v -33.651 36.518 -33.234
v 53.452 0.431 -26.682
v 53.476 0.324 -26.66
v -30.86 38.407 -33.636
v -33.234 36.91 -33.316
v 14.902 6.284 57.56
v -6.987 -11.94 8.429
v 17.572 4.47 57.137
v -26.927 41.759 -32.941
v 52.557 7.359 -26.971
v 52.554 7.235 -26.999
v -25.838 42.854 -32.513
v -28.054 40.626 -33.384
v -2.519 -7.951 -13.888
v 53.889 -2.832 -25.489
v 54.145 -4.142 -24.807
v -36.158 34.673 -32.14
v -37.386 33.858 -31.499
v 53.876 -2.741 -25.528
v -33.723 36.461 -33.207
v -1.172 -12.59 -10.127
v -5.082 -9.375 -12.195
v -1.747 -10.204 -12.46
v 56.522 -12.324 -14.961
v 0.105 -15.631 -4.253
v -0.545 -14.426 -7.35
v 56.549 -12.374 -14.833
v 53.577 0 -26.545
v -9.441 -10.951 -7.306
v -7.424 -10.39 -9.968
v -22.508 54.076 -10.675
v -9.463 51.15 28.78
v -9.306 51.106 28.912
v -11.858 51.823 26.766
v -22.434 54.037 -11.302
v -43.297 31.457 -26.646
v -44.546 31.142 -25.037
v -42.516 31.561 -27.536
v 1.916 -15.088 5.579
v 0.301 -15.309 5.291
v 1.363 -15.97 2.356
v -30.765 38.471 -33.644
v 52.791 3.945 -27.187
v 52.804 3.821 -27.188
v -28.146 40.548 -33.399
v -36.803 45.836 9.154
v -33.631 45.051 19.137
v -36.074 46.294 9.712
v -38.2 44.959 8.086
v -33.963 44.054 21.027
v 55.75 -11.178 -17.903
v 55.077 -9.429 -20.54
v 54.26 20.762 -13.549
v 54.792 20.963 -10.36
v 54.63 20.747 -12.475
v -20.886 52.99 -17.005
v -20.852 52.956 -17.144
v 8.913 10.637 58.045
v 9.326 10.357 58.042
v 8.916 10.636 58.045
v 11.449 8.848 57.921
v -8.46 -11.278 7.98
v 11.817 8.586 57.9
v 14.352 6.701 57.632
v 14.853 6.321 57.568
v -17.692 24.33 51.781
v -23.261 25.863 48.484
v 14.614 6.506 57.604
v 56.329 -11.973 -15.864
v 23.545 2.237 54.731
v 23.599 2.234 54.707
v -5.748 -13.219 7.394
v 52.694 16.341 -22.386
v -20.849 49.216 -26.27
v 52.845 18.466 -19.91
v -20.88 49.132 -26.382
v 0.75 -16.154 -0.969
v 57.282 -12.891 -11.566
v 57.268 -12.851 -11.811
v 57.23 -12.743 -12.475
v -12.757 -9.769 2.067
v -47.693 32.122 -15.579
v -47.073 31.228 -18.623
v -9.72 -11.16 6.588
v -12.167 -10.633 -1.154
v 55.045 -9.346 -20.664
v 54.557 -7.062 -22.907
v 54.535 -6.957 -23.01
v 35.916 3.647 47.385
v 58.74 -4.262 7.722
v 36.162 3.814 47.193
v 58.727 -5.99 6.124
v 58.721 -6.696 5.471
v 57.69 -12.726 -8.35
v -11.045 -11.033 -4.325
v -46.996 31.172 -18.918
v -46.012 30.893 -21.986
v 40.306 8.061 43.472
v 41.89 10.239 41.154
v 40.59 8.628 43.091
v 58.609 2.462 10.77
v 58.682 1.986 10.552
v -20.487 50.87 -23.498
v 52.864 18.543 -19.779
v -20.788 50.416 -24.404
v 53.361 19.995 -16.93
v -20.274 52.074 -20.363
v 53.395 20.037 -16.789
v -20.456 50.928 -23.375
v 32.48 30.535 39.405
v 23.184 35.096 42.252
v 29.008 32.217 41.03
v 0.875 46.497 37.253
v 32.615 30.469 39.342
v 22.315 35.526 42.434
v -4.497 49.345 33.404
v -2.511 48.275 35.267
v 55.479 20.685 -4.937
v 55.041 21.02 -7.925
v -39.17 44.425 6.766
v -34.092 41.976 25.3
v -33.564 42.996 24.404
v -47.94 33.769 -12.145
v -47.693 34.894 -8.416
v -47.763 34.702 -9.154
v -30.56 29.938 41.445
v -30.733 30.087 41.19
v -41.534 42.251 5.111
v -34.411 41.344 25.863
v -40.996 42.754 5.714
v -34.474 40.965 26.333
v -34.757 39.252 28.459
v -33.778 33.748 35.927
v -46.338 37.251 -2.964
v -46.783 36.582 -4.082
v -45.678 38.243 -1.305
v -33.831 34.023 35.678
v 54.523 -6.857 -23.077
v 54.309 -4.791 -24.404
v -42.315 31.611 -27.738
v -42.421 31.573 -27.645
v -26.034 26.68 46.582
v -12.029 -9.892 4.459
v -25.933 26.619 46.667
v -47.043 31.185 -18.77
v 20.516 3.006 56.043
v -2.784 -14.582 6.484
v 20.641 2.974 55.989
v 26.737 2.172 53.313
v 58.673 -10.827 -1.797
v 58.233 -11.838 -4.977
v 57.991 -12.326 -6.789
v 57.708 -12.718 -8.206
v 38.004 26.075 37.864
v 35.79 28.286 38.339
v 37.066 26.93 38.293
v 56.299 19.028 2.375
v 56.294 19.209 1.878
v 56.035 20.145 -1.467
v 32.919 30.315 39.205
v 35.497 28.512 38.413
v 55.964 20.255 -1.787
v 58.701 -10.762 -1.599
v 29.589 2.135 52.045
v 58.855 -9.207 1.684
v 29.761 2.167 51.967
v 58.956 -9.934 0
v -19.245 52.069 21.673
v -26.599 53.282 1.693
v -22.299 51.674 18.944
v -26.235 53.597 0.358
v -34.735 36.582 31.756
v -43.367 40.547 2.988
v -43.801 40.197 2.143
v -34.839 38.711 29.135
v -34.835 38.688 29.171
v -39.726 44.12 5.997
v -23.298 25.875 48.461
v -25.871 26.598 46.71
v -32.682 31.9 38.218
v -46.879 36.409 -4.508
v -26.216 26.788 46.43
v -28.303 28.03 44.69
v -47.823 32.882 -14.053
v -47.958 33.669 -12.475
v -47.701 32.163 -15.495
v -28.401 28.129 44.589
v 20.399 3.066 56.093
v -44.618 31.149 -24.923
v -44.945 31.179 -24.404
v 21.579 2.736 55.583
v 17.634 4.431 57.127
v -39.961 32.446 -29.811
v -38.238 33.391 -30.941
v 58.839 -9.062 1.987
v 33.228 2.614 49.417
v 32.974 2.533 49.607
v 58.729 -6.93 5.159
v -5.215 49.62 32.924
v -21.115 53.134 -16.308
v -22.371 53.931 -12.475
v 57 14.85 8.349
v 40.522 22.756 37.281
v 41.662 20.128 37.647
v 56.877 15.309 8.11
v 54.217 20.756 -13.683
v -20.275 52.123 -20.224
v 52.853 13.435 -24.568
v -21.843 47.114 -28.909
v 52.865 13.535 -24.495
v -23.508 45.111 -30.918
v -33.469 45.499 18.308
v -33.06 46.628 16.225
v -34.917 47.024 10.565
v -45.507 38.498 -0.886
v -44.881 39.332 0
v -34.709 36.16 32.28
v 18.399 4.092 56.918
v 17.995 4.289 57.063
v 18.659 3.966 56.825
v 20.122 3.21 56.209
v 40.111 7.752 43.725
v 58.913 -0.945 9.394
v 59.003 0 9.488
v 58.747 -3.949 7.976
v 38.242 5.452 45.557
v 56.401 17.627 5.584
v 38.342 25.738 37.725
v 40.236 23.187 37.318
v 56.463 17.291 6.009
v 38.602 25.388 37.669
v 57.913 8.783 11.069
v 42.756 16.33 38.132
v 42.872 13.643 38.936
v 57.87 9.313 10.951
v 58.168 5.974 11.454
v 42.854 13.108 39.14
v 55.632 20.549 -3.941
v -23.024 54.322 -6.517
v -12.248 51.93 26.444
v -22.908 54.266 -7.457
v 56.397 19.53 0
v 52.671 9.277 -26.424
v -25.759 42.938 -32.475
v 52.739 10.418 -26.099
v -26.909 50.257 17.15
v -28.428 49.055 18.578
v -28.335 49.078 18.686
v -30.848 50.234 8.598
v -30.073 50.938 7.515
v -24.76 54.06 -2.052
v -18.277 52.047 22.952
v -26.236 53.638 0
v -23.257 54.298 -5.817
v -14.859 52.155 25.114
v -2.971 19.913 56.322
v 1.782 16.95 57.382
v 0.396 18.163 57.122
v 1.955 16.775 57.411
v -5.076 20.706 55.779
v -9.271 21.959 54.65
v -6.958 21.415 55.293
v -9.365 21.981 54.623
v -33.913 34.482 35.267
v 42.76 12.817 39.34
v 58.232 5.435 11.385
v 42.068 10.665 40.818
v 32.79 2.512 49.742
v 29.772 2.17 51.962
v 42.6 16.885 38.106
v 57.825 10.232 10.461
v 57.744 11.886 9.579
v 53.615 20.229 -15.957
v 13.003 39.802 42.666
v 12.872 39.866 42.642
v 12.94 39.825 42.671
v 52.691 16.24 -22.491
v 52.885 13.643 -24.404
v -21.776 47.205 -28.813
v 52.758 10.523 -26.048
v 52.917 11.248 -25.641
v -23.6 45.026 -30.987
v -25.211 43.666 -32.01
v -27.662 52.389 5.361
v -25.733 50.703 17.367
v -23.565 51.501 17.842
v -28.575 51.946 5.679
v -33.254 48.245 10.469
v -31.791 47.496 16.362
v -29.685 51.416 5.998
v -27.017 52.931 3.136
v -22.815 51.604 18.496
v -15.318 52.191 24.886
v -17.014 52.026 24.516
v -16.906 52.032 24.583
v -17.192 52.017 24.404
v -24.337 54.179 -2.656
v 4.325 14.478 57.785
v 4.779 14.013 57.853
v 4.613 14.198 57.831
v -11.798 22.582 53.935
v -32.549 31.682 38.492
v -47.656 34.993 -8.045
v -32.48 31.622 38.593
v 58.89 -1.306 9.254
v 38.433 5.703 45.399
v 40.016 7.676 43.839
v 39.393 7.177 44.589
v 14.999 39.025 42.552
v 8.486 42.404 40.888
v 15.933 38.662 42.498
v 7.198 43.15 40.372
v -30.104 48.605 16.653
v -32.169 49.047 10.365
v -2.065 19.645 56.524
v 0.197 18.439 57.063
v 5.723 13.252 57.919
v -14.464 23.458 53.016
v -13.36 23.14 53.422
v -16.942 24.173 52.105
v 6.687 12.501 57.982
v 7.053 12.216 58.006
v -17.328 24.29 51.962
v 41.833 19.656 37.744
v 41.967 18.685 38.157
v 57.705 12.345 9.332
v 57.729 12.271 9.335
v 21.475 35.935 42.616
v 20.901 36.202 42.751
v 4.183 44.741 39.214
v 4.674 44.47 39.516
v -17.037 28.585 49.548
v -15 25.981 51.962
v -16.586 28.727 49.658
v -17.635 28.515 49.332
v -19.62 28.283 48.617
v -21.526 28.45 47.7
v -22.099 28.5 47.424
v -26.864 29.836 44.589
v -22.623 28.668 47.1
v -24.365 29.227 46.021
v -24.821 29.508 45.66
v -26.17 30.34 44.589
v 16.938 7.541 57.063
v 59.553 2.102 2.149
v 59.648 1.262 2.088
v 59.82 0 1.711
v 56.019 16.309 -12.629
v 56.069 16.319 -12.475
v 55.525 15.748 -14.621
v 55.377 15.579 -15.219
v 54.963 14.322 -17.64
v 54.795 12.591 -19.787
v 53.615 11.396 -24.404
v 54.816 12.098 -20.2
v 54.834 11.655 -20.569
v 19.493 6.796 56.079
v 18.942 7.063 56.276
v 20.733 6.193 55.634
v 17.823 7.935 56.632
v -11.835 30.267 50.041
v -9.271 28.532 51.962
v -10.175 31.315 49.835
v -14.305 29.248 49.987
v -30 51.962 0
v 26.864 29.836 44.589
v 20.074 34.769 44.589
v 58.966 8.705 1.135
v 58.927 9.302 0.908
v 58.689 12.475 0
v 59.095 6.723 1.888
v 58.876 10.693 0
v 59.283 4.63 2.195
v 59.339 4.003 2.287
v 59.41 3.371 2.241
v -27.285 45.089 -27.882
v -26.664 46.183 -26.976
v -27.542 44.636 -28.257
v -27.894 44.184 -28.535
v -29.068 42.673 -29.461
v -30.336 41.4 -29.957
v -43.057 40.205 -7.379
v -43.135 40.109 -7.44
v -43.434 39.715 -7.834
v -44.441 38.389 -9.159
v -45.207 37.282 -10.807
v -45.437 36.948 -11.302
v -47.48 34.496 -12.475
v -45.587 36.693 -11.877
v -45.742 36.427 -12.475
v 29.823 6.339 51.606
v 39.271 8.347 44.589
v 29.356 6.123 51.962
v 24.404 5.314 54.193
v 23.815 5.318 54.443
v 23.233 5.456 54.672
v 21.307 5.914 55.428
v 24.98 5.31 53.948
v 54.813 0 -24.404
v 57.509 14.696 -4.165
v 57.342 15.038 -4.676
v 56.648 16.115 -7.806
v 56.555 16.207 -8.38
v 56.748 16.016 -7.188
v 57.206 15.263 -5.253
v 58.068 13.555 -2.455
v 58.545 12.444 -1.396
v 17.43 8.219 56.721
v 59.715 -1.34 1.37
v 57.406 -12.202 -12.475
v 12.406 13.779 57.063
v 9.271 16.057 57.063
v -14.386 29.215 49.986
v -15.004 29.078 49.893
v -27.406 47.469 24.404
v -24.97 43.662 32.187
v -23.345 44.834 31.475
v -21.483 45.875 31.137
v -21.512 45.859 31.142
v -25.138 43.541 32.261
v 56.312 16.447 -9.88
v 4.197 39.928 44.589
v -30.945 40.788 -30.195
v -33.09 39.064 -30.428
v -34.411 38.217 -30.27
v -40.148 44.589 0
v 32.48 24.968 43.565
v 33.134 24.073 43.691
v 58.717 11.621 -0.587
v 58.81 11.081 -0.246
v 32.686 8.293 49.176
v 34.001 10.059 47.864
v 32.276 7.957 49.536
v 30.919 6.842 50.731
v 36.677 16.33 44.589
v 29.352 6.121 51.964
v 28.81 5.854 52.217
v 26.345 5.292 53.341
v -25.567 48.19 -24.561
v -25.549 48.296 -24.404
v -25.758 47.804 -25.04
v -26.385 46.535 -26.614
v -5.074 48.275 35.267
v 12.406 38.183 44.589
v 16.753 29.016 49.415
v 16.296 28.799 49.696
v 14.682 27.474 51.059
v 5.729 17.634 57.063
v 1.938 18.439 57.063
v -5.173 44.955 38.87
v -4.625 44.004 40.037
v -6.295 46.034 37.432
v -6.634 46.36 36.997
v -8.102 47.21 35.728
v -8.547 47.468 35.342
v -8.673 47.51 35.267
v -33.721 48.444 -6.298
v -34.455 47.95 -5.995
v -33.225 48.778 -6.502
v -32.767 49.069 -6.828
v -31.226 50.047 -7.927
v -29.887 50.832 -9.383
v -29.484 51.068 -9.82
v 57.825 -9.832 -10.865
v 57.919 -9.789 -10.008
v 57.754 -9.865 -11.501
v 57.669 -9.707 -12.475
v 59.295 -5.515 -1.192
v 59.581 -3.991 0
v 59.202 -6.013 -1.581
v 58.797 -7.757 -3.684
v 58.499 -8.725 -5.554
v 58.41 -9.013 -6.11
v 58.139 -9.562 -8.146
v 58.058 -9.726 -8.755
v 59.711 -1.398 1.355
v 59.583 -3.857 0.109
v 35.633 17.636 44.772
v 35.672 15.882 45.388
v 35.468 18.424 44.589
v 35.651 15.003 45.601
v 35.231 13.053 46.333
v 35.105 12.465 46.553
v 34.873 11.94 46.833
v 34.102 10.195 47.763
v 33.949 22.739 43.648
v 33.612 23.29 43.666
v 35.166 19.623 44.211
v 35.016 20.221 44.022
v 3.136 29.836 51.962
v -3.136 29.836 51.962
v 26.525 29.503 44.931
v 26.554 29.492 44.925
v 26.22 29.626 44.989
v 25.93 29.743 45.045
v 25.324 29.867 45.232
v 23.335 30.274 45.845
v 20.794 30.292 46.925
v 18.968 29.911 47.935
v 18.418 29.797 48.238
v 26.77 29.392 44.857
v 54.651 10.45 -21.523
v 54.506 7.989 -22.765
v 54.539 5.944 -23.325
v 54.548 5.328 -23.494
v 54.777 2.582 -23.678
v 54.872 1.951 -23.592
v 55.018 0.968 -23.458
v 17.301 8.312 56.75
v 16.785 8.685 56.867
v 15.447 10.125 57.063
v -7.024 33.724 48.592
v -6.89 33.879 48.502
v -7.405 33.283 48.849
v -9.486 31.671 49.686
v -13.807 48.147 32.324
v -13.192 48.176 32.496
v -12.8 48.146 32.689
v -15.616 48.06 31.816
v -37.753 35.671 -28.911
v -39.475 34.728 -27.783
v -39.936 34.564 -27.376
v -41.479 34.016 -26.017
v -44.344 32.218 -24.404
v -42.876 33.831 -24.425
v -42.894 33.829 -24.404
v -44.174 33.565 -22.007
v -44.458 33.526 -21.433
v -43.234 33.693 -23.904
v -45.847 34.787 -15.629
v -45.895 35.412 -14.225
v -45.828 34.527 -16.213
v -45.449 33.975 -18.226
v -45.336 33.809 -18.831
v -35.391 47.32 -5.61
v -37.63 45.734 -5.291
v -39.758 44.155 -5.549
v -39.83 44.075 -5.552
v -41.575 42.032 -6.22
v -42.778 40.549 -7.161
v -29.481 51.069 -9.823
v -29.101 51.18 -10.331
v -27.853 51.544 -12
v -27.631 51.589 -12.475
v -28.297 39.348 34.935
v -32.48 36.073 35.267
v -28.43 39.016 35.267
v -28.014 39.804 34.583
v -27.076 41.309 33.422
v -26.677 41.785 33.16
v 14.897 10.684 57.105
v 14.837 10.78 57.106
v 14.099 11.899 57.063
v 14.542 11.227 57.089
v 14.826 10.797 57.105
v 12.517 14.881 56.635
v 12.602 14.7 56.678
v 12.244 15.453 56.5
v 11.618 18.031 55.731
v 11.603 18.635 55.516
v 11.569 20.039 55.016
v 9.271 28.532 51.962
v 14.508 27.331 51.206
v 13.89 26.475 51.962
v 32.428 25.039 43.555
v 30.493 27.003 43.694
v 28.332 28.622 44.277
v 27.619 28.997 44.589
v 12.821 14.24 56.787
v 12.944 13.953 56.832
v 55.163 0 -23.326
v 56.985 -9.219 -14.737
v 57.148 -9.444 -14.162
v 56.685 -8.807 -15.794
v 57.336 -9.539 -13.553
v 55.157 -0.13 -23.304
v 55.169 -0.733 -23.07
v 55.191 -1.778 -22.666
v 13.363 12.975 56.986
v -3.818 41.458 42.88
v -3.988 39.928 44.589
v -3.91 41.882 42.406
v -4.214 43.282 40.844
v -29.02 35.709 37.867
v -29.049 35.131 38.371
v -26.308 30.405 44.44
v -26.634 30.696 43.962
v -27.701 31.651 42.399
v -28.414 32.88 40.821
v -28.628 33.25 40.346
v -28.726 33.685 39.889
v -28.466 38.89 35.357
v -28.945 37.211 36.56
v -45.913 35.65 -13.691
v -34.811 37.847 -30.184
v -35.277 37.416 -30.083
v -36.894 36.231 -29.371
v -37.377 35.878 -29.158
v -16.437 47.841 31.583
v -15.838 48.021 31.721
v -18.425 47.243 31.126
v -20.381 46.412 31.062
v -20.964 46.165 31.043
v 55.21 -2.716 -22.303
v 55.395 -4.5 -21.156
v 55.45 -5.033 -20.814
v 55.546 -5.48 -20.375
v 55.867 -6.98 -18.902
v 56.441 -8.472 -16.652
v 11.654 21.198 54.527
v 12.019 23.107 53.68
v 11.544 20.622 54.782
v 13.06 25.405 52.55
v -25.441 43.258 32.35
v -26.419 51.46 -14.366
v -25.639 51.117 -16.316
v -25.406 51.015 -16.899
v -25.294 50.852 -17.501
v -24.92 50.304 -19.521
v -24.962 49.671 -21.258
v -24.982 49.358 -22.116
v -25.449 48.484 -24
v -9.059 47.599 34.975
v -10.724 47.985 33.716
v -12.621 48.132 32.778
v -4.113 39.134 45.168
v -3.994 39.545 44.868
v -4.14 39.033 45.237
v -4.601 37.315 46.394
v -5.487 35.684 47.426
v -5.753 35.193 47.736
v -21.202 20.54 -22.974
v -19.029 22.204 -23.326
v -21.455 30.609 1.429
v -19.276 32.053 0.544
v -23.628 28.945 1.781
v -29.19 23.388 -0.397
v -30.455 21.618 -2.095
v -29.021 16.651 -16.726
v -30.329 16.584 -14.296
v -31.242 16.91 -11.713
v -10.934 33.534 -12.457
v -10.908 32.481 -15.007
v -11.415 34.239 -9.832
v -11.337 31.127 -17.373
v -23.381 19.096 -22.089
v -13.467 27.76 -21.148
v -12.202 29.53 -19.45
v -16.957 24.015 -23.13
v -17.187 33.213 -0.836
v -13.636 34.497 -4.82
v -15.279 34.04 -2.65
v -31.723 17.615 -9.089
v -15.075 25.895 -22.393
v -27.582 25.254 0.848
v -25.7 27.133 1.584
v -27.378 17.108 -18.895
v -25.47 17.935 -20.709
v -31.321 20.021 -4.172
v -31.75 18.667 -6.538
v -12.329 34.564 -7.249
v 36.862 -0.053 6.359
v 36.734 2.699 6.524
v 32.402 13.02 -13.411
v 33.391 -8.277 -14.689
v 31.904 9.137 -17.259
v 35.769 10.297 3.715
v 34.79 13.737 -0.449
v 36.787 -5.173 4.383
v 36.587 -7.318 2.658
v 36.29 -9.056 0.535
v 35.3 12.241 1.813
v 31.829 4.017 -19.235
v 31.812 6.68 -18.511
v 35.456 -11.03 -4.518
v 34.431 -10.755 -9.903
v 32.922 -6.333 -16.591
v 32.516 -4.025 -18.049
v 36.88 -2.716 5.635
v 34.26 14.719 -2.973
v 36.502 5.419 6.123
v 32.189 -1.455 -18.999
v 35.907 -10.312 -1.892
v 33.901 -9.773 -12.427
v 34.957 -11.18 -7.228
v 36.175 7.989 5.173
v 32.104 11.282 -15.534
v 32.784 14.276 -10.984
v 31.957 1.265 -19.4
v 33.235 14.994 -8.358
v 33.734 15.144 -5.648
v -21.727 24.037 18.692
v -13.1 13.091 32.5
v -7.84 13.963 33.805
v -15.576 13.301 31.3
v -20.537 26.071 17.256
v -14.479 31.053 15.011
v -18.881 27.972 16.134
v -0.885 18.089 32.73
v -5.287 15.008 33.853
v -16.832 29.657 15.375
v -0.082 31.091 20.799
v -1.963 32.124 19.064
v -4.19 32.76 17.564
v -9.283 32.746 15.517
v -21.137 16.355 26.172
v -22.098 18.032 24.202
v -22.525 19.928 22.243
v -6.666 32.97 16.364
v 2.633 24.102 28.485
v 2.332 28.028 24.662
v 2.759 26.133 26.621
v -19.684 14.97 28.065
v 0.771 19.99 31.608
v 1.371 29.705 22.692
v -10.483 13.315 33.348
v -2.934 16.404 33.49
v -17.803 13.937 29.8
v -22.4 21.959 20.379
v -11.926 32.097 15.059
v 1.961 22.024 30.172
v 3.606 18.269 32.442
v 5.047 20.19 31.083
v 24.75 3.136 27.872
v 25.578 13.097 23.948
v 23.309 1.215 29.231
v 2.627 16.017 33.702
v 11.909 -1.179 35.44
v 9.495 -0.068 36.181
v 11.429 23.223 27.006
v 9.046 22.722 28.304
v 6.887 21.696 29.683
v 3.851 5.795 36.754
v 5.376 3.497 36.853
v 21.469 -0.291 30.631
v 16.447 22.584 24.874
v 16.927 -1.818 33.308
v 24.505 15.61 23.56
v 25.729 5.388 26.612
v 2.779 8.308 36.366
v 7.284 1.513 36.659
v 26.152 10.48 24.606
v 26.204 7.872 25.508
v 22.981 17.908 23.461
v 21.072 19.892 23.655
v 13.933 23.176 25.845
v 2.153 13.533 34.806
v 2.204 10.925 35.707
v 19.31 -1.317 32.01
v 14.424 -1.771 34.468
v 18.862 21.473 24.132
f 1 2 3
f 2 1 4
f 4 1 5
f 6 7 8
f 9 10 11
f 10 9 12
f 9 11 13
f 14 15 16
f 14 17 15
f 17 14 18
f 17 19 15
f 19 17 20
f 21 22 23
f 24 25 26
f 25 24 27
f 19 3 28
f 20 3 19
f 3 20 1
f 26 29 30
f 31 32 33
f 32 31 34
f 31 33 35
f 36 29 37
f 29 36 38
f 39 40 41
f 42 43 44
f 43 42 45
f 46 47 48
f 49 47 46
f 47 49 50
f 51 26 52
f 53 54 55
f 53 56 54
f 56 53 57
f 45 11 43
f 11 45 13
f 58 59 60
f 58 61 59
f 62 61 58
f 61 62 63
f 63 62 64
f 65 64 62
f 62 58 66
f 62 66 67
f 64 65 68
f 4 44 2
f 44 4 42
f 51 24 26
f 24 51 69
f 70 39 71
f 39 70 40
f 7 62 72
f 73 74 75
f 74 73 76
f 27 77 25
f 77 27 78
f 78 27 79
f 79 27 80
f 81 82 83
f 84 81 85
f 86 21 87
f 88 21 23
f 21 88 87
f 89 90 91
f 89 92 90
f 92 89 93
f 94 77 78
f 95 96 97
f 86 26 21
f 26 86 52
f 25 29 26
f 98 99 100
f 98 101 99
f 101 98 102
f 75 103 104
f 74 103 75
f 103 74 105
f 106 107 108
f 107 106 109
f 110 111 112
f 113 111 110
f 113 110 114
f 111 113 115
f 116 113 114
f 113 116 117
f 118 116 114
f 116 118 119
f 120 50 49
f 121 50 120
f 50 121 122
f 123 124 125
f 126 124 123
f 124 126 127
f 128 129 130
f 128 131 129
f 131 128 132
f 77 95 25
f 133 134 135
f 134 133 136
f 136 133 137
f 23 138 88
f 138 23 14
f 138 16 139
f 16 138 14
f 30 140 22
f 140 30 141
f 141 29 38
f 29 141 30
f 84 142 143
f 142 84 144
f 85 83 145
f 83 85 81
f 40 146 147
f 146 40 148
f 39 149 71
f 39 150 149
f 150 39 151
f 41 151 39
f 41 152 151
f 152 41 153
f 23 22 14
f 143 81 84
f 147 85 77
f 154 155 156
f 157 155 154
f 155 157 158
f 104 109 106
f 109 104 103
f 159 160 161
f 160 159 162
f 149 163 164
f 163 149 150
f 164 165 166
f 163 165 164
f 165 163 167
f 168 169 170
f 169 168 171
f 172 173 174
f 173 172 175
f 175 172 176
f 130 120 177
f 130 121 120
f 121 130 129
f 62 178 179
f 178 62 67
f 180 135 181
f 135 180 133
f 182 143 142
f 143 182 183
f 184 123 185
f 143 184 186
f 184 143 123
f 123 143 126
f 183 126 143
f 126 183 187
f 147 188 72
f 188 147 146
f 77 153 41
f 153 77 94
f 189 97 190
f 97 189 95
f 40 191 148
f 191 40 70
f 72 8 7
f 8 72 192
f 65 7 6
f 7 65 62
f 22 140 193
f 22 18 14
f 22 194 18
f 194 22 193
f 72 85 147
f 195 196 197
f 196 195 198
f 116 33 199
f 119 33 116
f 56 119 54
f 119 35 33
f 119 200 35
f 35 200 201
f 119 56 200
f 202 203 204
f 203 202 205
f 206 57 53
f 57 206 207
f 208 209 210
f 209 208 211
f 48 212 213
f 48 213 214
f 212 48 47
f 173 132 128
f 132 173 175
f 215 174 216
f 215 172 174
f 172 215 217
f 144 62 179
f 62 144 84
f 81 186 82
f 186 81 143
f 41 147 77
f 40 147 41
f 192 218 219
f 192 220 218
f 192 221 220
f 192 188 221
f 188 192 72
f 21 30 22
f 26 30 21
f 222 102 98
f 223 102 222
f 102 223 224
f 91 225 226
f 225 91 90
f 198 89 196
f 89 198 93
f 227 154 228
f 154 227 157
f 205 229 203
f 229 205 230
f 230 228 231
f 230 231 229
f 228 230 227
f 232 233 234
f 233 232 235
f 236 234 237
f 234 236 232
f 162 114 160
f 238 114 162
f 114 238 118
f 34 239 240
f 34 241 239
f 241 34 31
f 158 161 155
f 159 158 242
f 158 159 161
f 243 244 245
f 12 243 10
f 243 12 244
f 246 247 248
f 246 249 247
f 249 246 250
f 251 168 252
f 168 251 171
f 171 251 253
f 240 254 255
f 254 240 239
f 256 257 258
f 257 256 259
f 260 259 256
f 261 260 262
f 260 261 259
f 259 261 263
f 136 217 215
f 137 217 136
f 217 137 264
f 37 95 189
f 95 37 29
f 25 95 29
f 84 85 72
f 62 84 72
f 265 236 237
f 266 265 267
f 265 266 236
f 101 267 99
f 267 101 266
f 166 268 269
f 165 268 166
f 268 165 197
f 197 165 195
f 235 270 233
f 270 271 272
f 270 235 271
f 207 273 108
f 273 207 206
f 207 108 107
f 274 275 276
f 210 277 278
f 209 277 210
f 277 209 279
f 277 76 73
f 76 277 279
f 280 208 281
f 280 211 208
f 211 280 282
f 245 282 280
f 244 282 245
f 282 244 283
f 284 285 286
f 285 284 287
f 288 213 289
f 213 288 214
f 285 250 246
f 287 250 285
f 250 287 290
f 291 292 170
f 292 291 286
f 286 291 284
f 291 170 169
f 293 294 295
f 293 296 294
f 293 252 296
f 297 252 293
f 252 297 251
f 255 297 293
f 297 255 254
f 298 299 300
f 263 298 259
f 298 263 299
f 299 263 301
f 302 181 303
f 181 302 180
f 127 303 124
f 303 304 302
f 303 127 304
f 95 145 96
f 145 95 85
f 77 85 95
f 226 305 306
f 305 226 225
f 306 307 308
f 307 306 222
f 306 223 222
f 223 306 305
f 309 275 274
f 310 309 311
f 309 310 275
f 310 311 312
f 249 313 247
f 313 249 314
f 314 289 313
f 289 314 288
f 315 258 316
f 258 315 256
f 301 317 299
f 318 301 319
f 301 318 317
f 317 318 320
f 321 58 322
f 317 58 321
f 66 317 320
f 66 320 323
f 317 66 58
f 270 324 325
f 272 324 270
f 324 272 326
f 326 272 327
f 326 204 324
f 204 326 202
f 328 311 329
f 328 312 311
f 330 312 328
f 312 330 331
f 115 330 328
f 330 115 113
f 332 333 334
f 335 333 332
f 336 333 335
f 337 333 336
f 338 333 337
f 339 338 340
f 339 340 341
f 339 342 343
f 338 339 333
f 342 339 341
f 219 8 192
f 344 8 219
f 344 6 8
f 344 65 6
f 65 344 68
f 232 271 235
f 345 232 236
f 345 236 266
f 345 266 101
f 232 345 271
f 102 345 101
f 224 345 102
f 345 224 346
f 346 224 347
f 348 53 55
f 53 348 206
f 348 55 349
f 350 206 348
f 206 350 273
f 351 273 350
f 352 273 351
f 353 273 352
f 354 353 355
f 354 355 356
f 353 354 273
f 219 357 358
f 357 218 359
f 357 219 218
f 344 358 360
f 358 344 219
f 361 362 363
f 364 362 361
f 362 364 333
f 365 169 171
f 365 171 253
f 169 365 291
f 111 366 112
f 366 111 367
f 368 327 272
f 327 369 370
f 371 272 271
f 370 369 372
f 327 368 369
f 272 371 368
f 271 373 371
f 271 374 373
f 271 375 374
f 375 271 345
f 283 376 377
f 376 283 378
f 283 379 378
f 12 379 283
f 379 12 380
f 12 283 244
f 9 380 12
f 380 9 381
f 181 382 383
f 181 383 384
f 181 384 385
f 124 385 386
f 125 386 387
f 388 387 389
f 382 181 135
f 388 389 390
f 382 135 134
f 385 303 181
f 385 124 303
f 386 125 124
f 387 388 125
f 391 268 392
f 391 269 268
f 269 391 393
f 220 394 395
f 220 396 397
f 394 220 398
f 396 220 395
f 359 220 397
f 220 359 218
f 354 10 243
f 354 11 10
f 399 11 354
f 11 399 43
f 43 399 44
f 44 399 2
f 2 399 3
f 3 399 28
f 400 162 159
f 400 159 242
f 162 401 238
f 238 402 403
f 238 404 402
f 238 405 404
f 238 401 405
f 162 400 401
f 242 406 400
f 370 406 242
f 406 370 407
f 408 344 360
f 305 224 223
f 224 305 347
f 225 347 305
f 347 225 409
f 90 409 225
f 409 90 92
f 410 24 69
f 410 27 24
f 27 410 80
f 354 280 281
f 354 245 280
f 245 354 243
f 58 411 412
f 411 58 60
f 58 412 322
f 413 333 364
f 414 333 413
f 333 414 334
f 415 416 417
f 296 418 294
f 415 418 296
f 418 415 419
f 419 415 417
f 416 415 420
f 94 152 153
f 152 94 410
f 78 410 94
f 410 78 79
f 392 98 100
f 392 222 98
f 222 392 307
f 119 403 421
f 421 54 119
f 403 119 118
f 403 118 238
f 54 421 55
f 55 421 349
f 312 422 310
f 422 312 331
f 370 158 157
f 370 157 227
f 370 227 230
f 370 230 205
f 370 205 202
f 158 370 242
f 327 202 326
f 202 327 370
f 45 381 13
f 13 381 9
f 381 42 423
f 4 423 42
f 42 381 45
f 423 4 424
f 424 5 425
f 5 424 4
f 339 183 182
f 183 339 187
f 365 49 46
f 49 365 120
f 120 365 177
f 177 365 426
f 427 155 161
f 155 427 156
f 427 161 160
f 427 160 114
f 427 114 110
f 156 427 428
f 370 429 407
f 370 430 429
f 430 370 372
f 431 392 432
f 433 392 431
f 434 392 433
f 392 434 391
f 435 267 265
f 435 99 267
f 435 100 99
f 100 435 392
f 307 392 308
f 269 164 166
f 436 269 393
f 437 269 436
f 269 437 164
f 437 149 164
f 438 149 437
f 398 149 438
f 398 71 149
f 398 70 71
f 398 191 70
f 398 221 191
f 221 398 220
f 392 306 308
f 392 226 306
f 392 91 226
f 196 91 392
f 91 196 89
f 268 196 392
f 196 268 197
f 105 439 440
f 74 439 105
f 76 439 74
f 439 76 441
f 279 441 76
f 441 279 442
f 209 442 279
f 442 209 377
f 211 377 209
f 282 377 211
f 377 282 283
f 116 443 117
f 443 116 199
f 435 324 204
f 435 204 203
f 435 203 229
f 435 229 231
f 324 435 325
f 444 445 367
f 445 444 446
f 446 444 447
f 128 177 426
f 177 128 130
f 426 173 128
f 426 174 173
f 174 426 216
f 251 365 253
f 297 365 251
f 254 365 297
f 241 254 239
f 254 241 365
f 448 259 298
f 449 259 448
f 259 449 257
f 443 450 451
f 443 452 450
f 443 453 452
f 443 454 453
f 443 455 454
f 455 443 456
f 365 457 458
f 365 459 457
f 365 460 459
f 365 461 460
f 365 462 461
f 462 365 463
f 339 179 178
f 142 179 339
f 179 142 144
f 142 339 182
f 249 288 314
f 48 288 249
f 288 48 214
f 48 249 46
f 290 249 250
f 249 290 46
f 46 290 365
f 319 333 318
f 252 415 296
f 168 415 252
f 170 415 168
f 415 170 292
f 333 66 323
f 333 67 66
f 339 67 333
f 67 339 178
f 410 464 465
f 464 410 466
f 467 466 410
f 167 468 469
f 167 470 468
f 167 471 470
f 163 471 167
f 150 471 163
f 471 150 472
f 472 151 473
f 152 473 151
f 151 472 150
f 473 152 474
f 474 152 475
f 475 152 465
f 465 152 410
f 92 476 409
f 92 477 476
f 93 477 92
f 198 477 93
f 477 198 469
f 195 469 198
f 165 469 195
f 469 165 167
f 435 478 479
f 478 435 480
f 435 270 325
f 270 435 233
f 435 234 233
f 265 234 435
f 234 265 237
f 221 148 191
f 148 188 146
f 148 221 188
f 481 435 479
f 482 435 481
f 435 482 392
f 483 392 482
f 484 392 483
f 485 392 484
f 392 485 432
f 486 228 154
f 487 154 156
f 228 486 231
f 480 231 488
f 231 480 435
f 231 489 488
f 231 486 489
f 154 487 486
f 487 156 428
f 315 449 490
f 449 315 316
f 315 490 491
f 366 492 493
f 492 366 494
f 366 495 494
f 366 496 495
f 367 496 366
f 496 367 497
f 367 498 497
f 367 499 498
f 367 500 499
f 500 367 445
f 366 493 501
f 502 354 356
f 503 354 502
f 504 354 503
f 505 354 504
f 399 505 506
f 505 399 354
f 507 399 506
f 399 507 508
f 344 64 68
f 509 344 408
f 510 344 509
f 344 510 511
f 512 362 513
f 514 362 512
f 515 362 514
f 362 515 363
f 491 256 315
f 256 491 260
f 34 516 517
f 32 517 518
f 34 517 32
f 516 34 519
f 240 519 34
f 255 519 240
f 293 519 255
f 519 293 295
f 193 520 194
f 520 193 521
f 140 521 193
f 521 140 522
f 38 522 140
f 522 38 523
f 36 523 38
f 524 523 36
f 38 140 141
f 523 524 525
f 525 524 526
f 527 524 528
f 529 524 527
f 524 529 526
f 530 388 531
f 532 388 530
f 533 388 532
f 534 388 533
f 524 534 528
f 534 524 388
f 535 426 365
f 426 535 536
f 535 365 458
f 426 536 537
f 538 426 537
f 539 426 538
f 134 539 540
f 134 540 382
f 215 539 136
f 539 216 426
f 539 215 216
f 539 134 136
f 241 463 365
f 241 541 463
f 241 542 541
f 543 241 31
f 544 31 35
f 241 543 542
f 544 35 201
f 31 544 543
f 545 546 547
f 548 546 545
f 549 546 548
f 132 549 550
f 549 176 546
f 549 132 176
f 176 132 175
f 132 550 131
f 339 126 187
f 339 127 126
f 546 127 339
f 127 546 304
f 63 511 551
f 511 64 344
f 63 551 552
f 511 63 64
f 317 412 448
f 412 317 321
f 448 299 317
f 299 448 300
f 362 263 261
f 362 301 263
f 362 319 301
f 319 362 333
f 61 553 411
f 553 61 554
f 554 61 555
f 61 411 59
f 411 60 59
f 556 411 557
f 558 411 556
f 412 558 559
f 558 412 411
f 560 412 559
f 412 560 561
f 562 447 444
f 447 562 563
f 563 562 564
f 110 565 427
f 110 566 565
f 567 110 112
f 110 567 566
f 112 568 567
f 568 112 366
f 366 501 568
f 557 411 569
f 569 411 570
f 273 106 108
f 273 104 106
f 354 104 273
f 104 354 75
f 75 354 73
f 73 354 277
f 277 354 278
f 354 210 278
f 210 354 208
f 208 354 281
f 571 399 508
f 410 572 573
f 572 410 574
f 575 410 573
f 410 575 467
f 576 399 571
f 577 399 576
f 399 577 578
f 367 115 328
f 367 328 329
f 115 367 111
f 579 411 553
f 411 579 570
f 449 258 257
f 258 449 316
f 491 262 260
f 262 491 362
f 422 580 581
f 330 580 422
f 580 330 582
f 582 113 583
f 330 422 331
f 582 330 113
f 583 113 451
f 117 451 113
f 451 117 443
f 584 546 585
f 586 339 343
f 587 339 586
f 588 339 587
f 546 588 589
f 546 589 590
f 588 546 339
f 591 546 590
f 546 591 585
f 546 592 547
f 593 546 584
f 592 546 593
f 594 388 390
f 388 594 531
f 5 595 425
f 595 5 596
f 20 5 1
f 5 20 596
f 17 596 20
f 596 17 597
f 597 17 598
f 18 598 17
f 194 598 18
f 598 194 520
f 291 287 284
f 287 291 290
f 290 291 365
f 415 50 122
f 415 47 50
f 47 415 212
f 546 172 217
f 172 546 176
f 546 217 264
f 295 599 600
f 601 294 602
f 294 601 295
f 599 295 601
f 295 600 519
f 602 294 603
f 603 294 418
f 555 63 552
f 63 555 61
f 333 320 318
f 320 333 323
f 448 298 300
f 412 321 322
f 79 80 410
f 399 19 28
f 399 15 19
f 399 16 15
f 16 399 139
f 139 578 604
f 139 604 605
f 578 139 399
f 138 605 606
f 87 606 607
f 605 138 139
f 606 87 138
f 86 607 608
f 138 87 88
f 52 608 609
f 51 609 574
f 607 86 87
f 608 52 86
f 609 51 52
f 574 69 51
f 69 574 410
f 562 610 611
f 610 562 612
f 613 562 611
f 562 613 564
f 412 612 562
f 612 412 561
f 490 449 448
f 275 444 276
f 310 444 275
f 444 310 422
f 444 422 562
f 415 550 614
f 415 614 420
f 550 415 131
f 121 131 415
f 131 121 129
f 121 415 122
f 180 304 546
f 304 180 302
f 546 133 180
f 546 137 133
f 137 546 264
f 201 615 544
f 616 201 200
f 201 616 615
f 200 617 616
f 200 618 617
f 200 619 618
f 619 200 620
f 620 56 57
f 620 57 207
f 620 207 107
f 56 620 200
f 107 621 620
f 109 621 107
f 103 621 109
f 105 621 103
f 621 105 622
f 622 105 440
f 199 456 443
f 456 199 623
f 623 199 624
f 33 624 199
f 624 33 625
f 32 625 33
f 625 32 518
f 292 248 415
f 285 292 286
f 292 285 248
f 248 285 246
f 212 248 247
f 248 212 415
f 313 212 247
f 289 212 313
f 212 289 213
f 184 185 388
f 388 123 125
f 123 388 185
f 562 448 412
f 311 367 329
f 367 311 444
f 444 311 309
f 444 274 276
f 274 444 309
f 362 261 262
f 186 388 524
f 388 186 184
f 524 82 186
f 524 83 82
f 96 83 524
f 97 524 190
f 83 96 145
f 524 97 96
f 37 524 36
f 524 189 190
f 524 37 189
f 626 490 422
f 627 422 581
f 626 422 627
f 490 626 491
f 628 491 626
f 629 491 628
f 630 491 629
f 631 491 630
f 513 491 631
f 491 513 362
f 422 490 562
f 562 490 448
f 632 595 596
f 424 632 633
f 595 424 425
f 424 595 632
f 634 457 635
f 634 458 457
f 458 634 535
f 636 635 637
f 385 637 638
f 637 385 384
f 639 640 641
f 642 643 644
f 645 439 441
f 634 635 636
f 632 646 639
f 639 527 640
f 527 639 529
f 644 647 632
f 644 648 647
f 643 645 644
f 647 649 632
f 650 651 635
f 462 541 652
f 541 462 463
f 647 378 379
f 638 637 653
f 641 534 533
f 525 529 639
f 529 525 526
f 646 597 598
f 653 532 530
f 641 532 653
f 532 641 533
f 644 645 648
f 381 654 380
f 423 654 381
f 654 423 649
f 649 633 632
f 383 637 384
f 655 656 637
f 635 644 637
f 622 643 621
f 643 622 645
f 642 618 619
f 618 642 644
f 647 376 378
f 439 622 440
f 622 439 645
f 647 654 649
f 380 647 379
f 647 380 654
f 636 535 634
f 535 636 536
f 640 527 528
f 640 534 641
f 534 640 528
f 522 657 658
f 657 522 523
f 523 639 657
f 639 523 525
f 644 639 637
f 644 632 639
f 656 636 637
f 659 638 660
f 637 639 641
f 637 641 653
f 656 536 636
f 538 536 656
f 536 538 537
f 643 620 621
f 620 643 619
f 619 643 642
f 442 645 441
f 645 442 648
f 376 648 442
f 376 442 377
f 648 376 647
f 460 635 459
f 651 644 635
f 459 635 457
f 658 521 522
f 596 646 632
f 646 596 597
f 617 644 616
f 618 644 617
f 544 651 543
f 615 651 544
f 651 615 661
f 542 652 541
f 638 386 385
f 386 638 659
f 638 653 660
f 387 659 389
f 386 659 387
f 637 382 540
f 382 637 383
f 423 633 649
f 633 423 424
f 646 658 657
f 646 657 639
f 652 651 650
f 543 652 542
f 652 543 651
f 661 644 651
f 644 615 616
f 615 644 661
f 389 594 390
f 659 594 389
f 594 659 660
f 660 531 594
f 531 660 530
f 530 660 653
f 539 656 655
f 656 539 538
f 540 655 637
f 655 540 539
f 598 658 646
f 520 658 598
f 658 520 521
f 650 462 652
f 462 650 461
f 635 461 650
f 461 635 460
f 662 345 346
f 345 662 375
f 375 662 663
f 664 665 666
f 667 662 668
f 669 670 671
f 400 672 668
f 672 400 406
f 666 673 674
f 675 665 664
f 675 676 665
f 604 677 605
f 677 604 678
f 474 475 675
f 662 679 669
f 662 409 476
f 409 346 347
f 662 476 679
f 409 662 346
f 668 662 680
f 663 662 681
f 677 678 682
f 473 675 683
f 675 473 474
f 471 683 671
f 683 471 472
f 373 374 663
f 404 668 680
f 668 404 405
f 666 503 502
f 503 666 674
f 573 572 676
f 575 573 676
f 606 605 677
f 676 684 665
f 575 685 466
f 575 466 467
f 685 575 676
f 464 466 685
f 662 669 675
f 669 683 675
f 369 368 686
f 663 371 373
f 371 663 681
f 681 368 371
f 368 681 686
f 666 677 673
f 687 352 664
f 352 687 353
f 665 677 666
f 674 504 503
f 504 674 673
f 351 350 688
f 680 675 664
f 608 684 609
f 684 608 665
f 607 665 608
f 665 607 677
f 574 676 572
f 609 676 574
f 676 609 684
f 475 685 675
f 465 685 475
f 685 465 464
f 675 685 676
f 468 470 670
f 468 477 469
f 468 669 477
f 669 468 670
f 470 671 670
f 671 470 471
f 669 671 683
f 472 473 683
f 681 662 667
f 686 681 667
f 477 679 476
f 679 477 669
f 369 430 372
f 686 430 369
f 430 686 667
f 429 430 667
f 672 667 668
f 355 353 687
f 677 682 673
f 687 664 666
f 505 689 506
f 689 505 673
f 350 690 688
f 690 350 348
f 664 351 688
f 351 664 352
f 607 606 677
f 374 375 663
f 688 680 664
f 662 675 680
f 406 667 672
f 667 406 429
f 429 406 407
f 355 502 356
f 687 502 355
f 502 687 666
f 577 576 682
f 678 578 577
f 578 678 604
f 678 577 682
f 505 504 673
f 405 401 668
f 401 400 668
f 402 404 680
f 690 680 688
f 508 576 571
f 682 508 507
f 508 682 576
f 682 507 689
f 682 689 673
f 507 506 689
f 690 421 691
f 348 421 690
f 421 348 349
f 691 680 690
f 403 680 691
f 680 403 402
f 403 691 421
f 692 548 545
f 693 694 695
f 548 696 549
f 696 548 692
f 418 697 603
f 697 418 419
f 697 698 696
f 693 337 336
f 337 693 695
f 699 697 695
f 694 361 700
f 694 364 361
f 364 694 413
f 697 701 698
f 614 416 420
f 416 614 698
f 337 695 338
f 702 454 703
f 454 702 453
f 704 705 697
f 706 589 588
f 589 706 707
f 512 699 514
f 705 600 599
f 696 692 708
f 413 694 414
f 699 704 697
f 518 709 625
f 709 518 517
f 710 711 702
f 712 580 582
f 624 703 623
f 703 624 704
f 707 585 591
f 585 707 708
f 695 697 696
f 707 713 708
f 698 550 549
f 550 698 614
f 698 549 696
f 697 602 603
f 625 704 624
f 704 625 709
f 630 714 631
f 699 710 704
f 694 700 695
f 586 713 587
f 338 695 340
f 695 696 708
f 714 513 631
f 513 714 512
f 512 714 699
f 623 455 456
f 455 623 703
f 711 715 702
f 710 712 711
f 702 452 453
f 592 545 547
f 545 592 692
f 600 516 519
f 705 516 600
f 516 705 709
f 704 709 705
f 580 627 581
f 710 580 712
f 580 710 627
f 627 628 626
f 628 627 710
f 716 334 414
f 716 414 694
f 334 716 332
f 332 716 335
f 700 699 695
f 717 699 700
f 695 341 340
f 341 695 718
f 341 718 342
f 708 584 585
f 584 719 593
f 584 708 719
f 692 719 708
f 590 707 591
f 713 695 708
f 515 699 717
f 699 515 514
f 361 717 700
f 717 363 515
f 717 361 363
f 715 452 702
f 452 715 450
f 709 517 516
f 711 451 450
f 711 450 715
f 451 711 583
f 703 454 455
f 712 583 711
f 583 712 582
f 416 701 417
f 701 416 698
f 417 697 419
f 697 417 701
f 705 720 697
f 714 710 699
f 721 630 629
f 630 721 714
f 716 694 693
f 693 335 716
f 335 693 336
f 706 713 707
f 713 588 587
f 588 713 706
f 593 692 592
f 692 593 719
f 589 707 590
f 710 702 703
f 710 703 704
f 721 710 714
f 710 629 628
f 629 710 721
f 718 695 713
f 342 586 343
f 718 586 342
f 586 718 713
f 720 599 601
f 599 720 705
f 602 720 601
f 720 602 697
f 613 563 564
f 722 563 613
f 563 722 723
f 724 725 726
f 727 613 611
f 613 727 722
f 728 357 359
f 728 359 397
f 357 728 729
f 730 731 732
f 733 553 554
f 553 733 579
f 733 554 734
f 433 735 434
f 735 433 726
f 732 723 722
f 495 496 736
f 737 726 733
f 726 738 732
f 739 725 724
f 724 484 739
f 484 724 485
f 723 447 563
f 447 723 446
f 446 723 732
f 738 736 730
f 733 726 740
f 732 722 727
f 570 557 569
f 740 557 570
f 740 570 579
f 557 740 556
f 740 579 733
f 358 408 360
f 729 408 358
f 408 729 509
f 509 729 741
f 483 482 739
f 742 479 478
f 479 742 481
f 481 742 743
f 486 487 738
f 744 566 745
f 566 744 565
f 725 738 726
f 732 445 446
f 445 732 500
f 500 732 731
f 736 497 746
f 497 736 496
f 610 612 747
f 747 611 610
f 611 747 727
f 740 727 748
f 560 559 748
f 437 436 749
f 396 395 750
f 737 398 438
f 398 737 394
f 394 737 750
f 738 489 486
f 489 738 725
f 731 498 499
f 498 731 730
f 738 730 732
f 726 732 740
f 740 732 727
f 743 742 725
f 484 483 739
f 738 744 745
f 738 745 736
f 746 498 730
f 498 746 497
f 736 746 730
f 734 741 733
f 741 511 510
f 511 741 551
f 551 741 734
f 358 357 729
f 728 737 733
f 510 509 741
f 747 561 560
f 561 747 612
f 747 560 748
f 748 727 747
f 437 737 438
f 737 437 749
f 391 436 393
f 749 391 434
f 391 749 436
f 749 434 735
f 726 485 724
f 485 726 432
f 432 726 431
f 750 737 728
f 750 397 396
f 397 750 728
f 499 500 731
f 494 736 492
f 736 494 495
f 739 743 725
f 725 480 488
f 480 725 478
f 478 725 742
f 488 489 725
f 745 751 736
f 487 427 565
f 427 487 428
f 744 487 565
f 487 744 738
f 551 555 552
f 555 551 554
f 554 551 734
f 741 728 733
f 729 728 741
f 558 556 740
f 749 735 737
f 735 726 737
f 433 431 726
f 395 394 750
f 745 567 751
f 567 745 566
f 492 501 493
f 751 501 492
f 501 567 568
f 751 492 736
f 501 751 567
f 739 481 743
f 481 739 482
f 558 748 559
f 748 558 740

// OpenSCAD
difference() {
	intersection() {
		hull() {
			rotate(a = -150.2044300830, v = [-0.4781958647, 0.1350745970, 0.0000000000]) {
				rotate(a = -90.0000000000, v = [-0.3826834324, 0.9238795325, 0.0000000000]) {
					cylinder(h = 60, r = 16.2000000000);
				}
			}
			rotate(a = -150.2044300830, v = [-0.4781958647, 0.1350745970, 0.0000000000]) {
				rotate(a = -90.0000000000, v = [-0.6087614290, -0.7933533403, 0.0000000000]) {
					cylinder(h = 60, r = 16.2000000000);
				}
			}
			rotate(a = -150.2044300830, v = [-0.4781958647, 0.1350745970, 0.0000000000]) {
				rotate(a = -151.9205722594, v = [-0.0084280234, 0.4706196600, 0.0000000000]) {
					cylinder(h = 60, r = 16.2000000000);
				}
			}
			rotate(a = -150.2044300830, v = [-0.4781958647, 0.1350745970, 0.0000000000]) {
				rotate(a = -161.5616070448, v = [-0.0090619990, -0.3161549461, 0.0000000000]) {
					cylinder(h = 60, r = 16.2000000000);
				}
			}
		}
		sphere(r = 60);
	}
	union() {
		rotate(a = -150.2044300830, v = [-0.4781958647, 0.1350745970, 0.0000000000]) {
			rotate(a = -90.0000000000, v = [-0.3826834324, 0.9238795325, 0.0000000000]) {
				translate(v = [0, 0, 35]) {
					cylinder(h = 100, r = 13.2000000000);
				}
			}
		}
		rotate(a = -150.2044300830, v = [-0.4781958647, 0.1350745970, 0.0000000000]) {
			rotate(a = -90.0000000000, v = [-0.6087614290, -0.7933533403, 0.0000000000]) {
				translate(v = [0, 0, 35]) {
					cylinder(h = 100, r = 13.2000000000);
				}
			}
		}
		rotate(a = -150.2044300830, v = [-0.4781958647, 0.1350745970, 0.0000000000]) {
			rotate(a = -151.9205722594, v = [-0.0084280234, 0.4706196600, 0.0000000000]) {
				translate(v = [0, 0, 35]) {
					cylinder(h = 100, r = 13.2000000000);
				}
			}
		}
		rotate(a = -150.2044300830, v = [-0.4781958647, 0.1350745970, 0.0000000000]) {
			rotate(a = -161.5616070448, v = [-0.0090619990, -0.3161549461, 0.0000000000]) {
				translate(v = [0, 0, 35]) {
					cylinder(h = 100, r = 13.2000000000);
				}
			}
		}
	}
}
